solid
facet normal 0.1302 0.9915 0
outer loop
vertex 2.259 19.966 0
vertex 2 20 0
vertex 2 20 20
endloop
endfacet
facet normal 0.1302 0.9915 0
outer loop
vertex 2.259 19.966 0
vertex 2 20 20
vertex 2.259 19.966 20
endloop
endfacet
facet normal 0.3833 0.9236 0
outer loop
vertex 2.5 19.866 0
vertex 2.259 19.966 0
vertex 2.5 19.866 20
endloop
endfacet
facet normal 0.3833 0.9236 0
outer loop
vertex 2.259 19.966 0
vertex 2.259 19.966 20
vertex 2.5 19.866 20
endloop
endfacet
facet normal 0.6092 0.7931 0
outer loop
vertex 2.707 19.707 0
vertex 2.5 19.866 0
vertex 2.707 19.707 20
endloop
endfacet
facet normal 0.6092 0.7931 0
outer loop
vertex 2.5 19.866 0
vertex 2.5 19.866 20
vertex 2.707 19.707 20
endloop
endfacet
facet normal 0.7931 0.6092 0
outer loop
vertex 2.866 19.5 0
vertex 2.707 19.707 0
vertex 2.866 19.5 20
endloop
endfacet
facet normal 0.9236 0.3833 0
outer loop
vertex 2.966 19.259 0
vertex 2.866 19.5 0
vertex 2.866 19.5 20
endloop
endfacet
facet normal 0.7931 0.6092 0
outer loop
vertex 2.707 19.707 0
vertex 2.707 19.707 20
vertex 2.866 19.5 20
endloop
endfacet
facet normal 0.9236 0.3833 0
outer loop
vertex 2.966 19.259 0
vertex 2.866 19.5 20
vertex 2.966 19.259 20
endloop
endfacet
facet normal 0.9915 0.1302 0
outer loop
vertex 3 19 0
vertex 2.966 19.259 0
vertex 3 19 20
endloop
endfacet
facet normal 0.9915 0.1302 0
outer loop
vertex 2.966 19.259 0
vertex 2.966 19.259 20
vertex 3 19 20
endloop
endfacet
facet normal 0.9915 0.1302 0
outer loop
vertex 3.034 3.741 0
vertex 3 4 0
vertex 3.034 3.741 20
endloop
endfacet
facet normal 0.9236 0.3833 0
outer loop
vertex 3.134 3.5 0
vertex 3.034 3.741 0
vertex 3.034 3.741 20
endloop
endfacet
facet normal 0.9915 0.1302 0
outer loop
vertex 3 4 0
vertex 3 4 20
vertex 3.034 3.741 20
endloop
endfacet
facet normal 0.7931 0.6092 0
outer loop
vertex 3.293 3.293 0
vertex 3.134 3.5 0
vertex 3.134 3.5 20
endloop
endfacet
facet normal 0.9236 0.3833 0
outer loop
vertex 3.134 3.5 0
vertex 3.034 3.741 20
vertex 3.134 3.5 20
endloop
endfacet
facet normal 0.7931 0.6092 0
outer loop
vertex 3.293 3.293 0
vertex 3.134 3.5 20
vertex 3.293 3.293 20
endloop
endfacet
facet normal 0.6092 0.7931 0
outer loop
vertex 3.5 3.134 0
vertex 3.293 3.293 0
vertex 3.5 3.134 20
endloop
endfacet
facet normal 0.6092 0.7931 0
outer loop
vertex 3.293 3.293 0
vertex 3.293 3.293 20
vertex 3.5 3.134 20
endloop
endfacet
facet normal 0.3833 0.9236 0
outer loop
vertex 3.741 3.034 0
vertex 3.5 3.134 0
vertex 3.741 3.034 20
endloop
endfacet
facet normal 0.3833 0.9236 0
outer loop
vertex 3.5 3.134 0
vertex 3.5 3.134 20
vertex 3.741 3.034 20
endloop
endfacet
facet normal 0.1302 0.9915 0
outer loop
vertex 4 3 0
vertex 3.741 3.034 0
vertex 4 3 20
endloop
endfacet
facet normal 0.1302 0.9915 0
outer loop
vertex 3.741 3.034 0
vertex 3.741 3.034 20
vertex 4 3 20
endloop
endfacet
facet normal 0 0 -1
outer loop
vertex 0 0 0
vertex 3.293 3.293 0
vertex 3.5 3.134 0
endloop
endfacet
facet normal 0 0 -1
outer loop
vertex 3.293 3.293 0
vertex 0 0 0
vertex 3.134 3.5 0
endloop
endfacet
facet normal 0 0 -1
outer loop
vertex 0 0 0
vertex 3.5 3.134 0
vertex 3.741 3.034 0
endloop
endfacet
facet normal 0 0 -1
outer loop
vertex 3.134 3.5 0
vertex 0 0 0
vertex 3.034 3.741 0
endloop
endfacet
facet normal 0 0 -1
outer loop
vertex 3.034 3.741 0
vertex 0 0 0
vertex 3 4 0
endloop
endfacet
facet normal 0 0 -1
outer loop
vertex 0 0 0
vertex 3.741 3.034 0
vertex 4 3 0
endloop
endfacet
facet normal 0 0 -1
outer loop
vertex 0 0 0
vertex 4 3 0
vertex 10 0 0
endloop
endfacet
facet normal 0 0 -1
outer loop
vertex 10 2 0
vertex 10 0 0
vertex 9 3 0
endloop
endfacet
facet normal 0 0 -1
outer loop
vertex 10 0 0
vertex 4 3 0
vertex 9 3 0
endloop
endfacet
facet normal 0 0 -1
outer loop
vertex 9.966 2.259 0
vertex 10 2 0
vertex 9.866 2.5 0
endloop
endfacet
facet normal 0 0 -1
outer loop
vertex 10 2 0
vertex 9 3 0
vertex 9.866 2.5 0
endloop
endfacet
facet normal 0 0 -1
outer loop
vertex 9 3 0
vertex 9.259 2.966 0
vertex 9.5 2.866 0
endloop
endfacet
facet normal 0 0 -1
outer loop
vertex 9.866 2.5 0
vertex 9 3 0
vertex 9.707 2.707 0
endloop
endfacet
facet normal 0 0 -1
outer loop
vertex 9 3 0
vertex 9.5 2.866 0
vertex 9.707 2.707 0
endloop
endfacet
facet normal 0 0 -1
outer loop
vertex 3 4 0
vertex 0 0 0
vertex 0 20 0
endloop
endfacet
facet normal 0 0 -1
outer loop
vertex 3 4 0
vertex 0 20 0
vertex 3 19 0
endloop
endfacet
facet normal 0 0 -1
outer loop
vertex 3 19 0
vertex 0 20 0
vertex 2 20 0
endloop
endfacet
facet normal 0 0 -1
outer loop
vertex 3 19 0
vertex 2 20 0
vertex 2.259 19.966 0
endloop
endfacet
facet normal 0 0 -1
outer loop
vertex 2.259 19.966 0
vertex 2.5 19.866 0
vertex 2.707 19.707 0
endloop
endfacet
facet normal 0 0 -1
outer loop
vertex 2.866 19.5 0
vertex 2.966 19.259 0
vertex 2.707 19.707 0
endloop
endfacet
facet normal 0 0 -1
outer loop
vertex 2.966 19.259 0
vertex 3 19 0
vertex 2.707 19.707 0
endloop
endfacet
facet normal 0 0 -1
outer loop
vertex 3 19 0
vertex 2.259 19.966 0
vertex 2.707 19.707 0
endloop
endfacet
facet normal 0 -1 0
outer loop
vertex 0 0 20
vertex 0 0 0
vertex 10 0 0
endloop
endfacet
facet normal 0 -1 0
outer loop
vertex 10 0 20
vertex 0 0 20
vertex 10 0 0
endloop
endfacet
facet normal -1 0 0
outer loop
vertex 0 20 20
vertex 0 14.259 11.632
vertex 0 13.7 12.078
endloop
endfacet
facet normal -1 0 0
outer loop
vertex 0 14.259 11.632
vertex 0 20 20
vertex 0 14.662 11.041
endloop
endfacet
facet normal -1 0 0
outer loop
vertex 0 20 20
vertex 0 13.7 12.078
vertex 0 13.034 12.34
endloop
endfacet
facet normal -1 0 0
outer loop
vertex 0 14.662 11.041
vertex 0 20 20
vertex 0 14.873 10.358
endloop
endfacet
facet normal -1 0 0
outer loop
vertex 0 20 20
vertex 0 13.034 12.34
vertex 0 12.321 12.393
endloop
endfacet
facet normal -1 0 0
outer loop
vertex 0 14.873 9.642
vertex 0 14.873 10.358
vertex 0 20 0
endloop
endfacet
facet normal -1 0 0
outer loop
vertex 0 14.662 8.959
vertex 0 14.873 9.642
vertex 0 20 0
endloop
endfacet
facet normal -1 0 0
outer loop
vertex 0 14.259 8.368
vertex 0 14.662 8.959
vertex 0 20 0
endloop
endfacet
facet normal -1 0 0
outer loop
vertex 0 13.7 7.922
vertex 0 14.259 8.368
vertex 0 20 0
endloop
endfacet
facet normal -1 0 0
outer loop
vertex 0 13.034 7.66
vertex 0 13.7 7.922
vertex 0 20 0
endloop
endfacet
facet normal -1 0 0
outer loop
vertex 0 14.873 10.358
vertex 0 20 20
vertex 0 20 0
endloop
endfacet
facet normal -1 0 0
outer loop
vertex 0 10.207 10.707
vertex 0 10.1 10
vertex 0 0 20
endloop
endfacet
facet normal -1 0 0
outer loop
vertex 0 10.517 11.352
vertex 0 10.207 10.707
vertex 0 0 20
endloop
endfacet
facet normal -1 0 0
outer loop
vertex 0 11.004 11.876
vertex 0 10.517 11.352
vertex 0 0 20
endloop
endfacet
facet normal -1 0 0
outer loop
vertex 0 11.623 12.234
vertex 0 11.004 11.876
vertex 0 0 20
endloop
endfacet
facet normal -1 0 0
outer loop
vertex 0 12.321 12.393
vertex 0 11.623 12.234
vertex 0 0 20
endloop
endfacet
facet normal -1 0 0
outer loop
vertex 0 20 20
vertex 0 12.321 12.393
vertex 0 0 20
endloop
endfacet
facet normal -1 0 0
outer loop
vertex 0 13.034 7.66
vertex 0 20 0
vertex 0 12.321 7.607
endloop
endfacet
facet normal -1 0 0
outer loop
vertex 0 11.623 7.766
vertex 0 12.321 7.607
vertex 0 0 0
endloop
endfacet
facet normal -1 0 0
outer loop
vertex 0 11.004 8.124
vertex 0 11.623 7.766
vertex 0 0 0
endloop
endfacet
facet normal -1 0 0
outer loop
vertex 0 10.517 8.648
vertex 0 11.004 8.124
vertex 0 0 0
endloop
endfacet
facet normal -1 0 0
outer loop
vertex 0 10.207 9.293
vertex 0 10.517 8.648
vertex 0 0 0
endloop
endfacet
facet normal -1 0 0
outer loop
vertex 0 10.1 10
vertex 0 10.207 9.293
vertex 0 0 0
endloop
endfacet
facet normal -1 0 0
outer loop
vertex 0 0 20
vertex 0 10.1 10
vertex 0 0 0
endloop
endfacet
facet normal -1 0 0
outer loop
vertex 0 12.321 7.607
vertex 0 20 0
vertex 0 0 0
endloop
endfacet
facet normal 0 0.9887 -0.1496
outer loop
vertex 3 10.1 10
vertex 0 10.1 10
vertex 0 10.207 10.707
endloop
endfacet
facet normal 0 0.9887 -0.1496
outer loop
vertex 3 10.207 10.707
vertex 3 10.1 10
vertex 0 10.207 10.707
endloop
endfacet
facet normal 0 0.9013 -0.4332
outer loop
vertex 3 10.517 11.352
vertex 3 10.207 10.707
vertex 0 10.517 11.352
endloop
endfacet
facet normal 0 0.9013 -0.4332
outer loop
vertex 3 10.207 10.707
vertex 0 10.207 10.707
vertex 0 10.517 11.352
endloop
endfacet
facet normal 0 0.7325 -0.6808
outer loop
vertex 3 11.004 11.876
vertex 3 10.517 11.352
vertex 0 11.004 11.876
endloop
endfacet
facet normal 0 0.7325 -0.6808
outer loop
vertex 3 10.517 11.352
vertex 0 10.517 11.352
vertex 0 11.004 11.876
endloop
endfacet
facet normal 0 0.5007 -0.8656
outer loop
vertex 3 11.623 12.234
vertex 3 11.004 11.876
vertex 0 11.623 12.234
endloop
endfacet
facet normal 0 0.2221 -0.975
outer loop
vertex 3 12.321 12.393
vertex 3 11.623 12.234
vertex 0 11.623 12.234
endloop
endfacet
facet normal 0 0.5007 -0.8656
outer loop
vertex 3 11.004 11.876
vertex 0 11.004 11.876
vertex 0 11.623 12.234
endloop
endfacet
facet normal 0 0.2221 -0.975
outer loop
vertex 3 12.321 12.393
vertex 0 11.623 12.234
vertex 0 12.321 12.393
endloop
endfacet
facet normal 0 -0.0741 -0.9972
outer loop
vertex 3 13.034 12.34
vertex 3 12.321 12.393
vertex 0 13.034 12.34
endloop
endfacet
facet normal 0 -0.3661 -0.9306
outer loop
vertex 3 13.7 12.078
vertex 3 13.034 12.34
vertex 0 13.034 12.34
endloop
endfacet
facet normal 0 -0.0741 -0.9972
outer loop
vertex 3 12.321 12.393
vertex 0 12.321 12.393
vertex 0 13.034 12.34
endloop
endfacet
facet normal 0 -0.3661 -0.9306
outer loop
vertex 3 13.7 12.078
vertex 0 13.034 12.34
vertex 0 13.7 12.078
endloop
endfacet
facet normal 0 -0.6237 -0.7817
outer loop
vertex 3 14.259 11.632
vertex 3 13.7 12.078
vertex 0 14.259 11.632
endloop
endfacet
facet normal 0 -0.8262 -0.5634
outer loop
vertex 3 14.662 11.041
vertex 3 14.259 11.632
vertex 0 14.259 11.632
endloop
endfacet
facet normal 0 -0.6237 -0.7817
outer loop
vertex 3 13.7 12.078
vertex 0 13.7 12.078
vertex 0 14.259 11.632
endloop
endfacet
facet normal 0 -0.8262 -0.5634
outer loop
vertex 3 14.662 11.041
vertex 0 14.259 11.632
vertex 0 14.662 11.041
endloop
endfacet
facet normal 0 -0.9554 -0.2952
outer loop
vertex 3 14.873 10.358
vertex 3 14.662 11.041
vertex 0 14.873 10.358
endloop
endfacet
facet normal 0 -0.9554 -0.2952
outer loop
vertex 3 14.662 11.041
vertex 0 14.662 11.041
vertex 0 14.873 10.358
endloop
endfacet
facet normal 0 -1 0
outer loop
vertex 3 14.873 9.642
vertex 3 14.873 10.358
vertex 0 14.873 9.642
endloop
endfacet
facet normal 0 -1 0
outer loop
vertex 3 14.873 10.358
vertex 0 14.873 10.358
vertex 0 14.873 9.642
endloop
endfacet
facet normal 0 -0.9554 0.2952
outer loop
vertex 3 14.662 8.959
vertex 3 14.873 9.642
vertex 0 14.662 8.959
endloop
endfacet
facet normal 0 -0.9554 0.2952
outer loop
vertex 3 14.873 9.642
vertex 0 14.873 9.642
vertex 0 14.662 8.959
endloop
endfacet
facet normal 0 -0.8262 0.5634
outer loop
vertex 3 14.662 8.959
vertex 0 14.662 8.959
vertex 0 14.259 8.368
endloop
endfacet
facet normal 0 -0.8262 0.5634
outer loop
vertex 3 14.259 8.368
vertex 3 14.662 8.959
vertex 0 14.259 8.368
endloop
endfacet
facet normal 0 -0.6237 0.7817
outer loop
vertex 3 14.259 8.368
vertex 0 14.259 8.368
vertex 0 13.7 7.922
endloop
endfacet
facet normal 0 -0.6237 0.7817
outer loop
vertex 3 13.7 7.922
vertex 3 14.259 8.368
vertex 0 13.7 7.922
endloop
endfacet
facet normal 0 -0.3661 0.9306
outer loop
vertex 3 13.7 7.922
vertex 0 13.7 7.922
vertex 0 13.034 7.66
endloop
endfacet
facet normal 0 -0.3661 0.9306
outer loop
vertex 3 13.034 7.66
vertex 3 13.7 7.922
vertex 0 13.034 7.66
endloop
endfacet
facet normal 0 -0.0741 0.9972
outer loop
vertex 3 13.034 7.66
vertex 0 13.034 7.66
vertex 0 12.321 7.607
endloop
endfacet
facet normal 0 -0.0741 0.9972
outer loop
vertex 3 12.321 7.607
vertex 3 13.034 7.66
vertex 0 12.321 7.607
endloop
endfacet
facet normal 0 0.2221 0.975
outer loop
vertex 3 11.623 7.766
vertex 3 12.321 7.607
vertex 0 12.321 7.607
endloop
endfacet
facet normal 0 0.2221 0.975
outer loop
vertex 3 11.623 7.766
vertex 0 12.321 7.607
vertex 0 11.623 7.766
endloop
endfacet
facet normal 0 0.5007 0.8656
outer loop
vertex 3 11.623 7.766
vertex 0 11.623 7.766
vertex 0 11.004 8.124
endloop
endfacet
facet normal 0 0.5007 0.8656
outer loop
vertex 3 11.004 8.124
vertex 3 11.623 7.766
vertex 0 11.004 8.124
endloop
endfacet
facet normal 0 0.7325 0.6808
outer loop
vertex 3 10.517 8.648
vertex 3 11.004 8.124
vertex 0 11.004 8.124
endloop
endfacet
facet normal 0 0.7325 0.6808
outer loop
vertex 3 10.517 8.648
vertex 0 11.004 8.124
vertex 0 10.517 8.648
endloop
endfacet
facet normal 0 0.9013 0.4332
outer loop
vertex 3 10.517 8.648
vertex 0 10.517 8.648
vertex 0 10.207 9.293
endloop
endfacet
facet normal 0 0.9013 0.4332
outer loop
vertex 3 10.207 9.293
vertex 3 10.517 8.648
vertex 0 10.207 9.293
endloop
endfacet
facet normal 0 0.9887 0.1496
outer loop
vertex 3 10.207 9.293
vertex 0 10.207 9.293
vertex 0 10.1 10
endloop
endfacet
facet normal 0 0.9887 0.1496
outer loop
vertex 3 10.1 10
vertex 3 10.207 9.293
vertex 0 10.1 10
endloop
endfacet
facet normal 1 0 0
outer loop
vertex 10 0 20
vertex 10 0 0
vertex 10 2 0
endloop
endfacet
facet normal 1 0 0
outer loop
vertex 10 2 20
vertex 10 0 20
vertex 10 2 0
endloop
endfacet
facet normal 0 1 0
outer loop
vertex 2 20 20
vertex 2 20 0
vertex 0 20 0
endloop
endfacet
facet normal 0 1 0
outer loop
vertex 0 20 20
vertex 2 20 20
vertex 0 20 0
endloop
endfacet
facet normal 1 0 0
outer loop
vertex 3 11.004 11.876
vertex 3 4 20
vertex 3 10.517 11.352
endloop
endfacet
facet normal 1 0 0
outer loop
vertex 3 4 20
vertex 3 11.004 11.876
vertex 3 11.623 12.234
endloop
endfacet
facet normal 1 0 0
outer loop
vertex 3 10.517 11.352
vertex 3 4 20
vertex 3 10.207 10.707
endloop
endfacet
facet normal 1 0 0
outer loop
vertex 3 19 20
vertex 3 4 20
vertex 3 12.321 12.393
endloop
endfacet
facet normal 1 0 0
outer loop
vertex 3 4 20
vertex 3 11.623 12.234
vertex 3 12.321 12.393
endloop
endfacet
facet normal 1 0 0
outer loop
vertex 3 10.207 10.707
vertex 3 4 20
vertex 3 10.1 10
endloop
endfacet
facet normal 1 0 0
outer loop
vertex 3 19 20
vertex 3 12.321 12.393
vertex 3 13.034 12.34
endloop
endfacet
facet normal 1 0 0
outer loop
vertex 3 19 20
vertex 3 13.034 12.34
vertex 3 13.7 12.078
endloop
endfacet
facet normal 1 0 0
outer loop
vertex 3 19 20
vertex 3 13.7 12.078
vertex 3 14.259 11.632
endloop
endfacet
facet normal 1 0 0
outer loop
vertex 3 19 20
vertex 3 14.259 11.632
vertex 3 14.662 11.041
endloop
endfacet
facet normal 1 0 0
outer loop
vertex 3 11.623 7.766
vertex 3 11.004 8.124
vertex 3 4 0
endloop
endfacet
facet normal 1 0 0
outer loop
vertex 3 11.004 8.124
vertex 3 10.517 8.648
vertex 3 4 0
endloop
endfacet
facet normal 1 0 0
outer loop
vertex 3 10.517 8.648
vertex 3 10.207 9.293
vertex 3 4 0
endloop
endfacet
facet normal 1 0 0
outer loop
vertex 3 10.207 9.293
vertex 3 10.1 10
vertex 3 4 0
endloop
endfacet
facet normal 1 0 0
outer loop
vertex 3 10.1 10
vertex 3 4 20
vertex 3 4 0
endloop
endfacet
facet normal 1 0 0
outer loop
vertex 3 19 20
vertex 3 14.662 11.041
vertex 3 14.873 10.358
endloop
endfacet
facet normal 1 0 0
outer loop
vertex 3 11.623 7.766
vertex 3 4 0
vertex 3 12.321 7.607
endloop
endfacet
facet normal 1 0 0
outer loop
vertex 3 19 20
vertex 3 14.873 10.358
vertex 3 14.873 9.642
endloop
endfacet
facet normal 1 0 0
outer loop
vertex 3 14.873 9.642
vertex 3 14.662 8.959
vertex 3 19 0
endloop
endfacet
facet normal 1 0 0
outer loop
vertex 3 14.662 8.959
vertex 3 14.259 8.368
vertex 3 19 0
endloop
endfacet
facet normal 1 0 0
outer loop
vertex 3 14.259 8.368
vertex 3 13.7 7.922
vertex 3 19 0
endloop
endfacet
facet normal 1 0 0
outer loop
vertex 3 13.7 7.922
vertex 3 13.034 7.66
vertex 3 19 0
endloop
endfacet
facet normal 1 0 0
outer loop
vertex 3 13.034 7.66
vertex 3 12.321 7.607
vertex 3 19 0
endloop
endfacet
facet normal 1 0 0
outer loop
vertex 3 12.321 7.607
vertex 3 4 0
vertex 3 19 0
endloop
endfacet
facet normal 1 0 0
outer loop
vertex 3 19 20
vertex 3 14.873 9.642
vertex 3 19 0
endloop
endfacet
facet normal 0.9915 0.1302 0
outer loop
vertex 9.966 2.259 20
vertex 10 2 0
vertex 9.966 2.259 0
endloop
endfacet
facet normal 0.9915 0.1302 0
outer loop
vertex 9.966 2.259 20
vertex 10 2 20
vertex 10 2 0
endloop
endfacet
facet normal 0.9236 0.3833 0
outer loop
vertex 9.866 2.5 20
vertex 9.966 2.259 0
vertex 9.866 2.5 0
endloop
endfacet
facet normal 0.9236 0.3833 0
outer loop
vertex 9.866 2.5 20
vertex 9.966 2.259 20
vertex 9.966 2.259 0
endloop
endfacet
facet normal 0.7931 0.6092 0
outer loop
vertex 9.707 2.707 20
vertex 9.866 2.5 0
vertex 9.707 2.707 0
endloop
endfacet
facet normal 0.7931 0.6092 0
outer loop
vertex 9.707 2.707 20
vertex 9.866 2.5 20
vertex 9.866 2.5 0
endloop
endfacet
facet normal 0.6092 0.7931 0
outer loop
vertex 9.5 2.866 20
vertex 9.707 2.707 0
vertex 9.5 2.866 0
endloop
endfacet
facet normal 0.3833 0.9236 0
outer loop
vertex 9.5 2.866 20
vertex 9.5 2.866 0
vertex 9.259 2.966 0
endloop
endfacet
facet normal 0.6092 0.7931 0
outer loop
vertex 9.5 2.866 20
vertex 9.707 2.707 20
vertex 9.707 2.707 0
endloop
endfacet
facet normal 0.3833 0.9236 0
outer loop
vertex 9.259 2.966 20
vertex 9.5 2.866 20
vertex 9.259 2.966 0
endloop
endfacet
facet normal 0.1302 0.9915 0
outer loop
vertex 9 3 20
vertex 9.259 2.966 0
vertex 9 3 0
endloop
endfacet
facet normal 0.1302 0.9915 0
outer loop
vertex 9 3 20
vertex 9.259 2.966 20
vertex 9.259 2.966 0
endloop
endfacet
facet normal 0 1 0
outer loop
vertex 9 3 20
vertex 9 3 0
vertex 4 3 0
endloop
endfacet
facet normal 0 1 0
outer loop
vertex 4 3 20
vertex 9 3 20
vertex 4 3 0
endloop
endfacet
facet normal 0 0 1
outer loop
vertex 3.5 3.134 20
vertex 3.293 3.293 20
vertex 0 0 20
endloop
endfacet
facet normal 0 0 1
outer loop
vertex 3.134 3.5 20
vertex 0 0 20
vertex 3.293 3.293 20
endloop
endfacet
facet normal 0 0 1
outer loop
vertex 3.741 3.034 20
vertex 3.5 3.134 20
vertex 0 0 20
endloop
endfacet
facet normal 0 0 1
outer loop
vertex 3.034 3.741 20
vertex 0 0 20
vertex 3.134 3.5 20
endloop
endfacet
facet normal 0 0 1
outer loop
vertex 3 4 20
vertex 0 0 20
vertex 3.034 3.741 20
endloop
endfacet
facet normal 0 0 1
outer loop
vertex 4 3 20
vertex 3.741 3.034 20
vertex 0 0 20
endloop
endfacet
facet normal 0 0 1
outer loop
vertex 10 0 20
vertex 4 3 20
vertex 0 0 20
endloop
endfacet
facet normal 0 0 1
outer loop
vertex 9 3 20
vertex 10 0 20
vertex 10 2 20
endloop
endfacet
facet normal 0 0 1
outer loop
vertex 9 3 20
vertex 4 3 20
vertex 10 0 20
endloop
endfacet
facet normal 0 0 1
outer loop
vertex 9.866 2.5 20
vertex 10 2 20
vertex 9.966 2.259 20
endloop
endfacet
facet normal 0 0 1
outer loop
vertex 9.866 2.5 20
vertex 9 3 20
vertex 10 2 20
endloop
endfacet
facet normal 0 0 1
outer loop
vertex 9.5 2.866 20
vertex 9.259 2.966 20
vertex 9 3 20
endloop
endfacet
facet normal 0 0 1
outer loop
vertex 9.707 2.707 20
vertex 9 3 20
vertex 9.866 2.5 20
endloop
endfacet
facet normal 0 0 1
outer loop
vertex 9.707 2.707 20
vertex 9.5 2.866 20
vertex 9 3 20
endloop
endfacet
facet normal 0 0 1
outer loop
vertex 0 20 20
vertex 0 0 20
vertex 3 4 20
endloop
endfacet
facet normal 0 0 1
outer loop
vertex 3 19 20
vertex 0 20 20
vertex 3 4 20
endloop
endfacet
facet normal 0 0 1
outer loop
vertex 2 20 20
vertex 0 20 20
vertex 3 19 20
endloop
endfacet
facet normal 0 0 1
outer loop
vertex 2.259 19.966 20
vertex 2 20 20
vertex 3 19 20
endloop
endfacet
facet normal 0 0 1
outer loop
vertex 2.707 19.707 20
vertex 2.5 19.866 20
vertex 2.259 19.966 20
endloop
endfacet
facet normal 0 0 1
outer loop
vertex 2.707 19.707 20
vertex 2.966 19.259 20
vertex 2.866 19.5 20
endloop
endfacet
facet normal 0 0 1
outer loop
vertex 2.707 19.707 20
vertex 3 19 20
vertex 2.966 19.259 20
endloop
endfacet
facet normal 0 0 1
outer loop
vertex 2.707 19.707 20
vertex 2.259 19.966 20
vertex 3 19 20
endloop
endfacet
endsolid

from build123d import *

# Parameters (mm, degrees)
EXTRUDE_1_DEPTH     = 20
SKETCH_2_R          = 2.4
CUT_EXTRUDE_1_DEPTH = 15
FILLET_1_R          = 1


with BuildPart() as part:
    # 草图1 → 凸台-拉伸1 (new body)
    with BuildSketch(Plane.XY):
        Polygon((0, 20), (0, 0), (10, 0), (10, 3), (3, 3), (3, 20), align=None)
    extrude(amount=EXTRUDE_1_DEPTH)

    # 草图2 → 切除-拉伸1 (cut)
    with BuildSketch(Plane.ZY):
        with Locations(Location((10, 12.5, 0), (0, 0, 270))):
            Circle(SKETCH_2_R)
    extrude(amount=-CUT_EXTRUDE_1_DEPTH, mode=Mode.SUBTRACT)

    # 圆角1
    fillet_1_edges = [part.edges().sort_by_distance(p)[0] for p in [
        (3, 20, 10),
        (3, 3, 10),
        (10, 3, 10),
    ]]
    fillet(fillet_1_edges, radius=FILLET_1_R)


solid = part.part
